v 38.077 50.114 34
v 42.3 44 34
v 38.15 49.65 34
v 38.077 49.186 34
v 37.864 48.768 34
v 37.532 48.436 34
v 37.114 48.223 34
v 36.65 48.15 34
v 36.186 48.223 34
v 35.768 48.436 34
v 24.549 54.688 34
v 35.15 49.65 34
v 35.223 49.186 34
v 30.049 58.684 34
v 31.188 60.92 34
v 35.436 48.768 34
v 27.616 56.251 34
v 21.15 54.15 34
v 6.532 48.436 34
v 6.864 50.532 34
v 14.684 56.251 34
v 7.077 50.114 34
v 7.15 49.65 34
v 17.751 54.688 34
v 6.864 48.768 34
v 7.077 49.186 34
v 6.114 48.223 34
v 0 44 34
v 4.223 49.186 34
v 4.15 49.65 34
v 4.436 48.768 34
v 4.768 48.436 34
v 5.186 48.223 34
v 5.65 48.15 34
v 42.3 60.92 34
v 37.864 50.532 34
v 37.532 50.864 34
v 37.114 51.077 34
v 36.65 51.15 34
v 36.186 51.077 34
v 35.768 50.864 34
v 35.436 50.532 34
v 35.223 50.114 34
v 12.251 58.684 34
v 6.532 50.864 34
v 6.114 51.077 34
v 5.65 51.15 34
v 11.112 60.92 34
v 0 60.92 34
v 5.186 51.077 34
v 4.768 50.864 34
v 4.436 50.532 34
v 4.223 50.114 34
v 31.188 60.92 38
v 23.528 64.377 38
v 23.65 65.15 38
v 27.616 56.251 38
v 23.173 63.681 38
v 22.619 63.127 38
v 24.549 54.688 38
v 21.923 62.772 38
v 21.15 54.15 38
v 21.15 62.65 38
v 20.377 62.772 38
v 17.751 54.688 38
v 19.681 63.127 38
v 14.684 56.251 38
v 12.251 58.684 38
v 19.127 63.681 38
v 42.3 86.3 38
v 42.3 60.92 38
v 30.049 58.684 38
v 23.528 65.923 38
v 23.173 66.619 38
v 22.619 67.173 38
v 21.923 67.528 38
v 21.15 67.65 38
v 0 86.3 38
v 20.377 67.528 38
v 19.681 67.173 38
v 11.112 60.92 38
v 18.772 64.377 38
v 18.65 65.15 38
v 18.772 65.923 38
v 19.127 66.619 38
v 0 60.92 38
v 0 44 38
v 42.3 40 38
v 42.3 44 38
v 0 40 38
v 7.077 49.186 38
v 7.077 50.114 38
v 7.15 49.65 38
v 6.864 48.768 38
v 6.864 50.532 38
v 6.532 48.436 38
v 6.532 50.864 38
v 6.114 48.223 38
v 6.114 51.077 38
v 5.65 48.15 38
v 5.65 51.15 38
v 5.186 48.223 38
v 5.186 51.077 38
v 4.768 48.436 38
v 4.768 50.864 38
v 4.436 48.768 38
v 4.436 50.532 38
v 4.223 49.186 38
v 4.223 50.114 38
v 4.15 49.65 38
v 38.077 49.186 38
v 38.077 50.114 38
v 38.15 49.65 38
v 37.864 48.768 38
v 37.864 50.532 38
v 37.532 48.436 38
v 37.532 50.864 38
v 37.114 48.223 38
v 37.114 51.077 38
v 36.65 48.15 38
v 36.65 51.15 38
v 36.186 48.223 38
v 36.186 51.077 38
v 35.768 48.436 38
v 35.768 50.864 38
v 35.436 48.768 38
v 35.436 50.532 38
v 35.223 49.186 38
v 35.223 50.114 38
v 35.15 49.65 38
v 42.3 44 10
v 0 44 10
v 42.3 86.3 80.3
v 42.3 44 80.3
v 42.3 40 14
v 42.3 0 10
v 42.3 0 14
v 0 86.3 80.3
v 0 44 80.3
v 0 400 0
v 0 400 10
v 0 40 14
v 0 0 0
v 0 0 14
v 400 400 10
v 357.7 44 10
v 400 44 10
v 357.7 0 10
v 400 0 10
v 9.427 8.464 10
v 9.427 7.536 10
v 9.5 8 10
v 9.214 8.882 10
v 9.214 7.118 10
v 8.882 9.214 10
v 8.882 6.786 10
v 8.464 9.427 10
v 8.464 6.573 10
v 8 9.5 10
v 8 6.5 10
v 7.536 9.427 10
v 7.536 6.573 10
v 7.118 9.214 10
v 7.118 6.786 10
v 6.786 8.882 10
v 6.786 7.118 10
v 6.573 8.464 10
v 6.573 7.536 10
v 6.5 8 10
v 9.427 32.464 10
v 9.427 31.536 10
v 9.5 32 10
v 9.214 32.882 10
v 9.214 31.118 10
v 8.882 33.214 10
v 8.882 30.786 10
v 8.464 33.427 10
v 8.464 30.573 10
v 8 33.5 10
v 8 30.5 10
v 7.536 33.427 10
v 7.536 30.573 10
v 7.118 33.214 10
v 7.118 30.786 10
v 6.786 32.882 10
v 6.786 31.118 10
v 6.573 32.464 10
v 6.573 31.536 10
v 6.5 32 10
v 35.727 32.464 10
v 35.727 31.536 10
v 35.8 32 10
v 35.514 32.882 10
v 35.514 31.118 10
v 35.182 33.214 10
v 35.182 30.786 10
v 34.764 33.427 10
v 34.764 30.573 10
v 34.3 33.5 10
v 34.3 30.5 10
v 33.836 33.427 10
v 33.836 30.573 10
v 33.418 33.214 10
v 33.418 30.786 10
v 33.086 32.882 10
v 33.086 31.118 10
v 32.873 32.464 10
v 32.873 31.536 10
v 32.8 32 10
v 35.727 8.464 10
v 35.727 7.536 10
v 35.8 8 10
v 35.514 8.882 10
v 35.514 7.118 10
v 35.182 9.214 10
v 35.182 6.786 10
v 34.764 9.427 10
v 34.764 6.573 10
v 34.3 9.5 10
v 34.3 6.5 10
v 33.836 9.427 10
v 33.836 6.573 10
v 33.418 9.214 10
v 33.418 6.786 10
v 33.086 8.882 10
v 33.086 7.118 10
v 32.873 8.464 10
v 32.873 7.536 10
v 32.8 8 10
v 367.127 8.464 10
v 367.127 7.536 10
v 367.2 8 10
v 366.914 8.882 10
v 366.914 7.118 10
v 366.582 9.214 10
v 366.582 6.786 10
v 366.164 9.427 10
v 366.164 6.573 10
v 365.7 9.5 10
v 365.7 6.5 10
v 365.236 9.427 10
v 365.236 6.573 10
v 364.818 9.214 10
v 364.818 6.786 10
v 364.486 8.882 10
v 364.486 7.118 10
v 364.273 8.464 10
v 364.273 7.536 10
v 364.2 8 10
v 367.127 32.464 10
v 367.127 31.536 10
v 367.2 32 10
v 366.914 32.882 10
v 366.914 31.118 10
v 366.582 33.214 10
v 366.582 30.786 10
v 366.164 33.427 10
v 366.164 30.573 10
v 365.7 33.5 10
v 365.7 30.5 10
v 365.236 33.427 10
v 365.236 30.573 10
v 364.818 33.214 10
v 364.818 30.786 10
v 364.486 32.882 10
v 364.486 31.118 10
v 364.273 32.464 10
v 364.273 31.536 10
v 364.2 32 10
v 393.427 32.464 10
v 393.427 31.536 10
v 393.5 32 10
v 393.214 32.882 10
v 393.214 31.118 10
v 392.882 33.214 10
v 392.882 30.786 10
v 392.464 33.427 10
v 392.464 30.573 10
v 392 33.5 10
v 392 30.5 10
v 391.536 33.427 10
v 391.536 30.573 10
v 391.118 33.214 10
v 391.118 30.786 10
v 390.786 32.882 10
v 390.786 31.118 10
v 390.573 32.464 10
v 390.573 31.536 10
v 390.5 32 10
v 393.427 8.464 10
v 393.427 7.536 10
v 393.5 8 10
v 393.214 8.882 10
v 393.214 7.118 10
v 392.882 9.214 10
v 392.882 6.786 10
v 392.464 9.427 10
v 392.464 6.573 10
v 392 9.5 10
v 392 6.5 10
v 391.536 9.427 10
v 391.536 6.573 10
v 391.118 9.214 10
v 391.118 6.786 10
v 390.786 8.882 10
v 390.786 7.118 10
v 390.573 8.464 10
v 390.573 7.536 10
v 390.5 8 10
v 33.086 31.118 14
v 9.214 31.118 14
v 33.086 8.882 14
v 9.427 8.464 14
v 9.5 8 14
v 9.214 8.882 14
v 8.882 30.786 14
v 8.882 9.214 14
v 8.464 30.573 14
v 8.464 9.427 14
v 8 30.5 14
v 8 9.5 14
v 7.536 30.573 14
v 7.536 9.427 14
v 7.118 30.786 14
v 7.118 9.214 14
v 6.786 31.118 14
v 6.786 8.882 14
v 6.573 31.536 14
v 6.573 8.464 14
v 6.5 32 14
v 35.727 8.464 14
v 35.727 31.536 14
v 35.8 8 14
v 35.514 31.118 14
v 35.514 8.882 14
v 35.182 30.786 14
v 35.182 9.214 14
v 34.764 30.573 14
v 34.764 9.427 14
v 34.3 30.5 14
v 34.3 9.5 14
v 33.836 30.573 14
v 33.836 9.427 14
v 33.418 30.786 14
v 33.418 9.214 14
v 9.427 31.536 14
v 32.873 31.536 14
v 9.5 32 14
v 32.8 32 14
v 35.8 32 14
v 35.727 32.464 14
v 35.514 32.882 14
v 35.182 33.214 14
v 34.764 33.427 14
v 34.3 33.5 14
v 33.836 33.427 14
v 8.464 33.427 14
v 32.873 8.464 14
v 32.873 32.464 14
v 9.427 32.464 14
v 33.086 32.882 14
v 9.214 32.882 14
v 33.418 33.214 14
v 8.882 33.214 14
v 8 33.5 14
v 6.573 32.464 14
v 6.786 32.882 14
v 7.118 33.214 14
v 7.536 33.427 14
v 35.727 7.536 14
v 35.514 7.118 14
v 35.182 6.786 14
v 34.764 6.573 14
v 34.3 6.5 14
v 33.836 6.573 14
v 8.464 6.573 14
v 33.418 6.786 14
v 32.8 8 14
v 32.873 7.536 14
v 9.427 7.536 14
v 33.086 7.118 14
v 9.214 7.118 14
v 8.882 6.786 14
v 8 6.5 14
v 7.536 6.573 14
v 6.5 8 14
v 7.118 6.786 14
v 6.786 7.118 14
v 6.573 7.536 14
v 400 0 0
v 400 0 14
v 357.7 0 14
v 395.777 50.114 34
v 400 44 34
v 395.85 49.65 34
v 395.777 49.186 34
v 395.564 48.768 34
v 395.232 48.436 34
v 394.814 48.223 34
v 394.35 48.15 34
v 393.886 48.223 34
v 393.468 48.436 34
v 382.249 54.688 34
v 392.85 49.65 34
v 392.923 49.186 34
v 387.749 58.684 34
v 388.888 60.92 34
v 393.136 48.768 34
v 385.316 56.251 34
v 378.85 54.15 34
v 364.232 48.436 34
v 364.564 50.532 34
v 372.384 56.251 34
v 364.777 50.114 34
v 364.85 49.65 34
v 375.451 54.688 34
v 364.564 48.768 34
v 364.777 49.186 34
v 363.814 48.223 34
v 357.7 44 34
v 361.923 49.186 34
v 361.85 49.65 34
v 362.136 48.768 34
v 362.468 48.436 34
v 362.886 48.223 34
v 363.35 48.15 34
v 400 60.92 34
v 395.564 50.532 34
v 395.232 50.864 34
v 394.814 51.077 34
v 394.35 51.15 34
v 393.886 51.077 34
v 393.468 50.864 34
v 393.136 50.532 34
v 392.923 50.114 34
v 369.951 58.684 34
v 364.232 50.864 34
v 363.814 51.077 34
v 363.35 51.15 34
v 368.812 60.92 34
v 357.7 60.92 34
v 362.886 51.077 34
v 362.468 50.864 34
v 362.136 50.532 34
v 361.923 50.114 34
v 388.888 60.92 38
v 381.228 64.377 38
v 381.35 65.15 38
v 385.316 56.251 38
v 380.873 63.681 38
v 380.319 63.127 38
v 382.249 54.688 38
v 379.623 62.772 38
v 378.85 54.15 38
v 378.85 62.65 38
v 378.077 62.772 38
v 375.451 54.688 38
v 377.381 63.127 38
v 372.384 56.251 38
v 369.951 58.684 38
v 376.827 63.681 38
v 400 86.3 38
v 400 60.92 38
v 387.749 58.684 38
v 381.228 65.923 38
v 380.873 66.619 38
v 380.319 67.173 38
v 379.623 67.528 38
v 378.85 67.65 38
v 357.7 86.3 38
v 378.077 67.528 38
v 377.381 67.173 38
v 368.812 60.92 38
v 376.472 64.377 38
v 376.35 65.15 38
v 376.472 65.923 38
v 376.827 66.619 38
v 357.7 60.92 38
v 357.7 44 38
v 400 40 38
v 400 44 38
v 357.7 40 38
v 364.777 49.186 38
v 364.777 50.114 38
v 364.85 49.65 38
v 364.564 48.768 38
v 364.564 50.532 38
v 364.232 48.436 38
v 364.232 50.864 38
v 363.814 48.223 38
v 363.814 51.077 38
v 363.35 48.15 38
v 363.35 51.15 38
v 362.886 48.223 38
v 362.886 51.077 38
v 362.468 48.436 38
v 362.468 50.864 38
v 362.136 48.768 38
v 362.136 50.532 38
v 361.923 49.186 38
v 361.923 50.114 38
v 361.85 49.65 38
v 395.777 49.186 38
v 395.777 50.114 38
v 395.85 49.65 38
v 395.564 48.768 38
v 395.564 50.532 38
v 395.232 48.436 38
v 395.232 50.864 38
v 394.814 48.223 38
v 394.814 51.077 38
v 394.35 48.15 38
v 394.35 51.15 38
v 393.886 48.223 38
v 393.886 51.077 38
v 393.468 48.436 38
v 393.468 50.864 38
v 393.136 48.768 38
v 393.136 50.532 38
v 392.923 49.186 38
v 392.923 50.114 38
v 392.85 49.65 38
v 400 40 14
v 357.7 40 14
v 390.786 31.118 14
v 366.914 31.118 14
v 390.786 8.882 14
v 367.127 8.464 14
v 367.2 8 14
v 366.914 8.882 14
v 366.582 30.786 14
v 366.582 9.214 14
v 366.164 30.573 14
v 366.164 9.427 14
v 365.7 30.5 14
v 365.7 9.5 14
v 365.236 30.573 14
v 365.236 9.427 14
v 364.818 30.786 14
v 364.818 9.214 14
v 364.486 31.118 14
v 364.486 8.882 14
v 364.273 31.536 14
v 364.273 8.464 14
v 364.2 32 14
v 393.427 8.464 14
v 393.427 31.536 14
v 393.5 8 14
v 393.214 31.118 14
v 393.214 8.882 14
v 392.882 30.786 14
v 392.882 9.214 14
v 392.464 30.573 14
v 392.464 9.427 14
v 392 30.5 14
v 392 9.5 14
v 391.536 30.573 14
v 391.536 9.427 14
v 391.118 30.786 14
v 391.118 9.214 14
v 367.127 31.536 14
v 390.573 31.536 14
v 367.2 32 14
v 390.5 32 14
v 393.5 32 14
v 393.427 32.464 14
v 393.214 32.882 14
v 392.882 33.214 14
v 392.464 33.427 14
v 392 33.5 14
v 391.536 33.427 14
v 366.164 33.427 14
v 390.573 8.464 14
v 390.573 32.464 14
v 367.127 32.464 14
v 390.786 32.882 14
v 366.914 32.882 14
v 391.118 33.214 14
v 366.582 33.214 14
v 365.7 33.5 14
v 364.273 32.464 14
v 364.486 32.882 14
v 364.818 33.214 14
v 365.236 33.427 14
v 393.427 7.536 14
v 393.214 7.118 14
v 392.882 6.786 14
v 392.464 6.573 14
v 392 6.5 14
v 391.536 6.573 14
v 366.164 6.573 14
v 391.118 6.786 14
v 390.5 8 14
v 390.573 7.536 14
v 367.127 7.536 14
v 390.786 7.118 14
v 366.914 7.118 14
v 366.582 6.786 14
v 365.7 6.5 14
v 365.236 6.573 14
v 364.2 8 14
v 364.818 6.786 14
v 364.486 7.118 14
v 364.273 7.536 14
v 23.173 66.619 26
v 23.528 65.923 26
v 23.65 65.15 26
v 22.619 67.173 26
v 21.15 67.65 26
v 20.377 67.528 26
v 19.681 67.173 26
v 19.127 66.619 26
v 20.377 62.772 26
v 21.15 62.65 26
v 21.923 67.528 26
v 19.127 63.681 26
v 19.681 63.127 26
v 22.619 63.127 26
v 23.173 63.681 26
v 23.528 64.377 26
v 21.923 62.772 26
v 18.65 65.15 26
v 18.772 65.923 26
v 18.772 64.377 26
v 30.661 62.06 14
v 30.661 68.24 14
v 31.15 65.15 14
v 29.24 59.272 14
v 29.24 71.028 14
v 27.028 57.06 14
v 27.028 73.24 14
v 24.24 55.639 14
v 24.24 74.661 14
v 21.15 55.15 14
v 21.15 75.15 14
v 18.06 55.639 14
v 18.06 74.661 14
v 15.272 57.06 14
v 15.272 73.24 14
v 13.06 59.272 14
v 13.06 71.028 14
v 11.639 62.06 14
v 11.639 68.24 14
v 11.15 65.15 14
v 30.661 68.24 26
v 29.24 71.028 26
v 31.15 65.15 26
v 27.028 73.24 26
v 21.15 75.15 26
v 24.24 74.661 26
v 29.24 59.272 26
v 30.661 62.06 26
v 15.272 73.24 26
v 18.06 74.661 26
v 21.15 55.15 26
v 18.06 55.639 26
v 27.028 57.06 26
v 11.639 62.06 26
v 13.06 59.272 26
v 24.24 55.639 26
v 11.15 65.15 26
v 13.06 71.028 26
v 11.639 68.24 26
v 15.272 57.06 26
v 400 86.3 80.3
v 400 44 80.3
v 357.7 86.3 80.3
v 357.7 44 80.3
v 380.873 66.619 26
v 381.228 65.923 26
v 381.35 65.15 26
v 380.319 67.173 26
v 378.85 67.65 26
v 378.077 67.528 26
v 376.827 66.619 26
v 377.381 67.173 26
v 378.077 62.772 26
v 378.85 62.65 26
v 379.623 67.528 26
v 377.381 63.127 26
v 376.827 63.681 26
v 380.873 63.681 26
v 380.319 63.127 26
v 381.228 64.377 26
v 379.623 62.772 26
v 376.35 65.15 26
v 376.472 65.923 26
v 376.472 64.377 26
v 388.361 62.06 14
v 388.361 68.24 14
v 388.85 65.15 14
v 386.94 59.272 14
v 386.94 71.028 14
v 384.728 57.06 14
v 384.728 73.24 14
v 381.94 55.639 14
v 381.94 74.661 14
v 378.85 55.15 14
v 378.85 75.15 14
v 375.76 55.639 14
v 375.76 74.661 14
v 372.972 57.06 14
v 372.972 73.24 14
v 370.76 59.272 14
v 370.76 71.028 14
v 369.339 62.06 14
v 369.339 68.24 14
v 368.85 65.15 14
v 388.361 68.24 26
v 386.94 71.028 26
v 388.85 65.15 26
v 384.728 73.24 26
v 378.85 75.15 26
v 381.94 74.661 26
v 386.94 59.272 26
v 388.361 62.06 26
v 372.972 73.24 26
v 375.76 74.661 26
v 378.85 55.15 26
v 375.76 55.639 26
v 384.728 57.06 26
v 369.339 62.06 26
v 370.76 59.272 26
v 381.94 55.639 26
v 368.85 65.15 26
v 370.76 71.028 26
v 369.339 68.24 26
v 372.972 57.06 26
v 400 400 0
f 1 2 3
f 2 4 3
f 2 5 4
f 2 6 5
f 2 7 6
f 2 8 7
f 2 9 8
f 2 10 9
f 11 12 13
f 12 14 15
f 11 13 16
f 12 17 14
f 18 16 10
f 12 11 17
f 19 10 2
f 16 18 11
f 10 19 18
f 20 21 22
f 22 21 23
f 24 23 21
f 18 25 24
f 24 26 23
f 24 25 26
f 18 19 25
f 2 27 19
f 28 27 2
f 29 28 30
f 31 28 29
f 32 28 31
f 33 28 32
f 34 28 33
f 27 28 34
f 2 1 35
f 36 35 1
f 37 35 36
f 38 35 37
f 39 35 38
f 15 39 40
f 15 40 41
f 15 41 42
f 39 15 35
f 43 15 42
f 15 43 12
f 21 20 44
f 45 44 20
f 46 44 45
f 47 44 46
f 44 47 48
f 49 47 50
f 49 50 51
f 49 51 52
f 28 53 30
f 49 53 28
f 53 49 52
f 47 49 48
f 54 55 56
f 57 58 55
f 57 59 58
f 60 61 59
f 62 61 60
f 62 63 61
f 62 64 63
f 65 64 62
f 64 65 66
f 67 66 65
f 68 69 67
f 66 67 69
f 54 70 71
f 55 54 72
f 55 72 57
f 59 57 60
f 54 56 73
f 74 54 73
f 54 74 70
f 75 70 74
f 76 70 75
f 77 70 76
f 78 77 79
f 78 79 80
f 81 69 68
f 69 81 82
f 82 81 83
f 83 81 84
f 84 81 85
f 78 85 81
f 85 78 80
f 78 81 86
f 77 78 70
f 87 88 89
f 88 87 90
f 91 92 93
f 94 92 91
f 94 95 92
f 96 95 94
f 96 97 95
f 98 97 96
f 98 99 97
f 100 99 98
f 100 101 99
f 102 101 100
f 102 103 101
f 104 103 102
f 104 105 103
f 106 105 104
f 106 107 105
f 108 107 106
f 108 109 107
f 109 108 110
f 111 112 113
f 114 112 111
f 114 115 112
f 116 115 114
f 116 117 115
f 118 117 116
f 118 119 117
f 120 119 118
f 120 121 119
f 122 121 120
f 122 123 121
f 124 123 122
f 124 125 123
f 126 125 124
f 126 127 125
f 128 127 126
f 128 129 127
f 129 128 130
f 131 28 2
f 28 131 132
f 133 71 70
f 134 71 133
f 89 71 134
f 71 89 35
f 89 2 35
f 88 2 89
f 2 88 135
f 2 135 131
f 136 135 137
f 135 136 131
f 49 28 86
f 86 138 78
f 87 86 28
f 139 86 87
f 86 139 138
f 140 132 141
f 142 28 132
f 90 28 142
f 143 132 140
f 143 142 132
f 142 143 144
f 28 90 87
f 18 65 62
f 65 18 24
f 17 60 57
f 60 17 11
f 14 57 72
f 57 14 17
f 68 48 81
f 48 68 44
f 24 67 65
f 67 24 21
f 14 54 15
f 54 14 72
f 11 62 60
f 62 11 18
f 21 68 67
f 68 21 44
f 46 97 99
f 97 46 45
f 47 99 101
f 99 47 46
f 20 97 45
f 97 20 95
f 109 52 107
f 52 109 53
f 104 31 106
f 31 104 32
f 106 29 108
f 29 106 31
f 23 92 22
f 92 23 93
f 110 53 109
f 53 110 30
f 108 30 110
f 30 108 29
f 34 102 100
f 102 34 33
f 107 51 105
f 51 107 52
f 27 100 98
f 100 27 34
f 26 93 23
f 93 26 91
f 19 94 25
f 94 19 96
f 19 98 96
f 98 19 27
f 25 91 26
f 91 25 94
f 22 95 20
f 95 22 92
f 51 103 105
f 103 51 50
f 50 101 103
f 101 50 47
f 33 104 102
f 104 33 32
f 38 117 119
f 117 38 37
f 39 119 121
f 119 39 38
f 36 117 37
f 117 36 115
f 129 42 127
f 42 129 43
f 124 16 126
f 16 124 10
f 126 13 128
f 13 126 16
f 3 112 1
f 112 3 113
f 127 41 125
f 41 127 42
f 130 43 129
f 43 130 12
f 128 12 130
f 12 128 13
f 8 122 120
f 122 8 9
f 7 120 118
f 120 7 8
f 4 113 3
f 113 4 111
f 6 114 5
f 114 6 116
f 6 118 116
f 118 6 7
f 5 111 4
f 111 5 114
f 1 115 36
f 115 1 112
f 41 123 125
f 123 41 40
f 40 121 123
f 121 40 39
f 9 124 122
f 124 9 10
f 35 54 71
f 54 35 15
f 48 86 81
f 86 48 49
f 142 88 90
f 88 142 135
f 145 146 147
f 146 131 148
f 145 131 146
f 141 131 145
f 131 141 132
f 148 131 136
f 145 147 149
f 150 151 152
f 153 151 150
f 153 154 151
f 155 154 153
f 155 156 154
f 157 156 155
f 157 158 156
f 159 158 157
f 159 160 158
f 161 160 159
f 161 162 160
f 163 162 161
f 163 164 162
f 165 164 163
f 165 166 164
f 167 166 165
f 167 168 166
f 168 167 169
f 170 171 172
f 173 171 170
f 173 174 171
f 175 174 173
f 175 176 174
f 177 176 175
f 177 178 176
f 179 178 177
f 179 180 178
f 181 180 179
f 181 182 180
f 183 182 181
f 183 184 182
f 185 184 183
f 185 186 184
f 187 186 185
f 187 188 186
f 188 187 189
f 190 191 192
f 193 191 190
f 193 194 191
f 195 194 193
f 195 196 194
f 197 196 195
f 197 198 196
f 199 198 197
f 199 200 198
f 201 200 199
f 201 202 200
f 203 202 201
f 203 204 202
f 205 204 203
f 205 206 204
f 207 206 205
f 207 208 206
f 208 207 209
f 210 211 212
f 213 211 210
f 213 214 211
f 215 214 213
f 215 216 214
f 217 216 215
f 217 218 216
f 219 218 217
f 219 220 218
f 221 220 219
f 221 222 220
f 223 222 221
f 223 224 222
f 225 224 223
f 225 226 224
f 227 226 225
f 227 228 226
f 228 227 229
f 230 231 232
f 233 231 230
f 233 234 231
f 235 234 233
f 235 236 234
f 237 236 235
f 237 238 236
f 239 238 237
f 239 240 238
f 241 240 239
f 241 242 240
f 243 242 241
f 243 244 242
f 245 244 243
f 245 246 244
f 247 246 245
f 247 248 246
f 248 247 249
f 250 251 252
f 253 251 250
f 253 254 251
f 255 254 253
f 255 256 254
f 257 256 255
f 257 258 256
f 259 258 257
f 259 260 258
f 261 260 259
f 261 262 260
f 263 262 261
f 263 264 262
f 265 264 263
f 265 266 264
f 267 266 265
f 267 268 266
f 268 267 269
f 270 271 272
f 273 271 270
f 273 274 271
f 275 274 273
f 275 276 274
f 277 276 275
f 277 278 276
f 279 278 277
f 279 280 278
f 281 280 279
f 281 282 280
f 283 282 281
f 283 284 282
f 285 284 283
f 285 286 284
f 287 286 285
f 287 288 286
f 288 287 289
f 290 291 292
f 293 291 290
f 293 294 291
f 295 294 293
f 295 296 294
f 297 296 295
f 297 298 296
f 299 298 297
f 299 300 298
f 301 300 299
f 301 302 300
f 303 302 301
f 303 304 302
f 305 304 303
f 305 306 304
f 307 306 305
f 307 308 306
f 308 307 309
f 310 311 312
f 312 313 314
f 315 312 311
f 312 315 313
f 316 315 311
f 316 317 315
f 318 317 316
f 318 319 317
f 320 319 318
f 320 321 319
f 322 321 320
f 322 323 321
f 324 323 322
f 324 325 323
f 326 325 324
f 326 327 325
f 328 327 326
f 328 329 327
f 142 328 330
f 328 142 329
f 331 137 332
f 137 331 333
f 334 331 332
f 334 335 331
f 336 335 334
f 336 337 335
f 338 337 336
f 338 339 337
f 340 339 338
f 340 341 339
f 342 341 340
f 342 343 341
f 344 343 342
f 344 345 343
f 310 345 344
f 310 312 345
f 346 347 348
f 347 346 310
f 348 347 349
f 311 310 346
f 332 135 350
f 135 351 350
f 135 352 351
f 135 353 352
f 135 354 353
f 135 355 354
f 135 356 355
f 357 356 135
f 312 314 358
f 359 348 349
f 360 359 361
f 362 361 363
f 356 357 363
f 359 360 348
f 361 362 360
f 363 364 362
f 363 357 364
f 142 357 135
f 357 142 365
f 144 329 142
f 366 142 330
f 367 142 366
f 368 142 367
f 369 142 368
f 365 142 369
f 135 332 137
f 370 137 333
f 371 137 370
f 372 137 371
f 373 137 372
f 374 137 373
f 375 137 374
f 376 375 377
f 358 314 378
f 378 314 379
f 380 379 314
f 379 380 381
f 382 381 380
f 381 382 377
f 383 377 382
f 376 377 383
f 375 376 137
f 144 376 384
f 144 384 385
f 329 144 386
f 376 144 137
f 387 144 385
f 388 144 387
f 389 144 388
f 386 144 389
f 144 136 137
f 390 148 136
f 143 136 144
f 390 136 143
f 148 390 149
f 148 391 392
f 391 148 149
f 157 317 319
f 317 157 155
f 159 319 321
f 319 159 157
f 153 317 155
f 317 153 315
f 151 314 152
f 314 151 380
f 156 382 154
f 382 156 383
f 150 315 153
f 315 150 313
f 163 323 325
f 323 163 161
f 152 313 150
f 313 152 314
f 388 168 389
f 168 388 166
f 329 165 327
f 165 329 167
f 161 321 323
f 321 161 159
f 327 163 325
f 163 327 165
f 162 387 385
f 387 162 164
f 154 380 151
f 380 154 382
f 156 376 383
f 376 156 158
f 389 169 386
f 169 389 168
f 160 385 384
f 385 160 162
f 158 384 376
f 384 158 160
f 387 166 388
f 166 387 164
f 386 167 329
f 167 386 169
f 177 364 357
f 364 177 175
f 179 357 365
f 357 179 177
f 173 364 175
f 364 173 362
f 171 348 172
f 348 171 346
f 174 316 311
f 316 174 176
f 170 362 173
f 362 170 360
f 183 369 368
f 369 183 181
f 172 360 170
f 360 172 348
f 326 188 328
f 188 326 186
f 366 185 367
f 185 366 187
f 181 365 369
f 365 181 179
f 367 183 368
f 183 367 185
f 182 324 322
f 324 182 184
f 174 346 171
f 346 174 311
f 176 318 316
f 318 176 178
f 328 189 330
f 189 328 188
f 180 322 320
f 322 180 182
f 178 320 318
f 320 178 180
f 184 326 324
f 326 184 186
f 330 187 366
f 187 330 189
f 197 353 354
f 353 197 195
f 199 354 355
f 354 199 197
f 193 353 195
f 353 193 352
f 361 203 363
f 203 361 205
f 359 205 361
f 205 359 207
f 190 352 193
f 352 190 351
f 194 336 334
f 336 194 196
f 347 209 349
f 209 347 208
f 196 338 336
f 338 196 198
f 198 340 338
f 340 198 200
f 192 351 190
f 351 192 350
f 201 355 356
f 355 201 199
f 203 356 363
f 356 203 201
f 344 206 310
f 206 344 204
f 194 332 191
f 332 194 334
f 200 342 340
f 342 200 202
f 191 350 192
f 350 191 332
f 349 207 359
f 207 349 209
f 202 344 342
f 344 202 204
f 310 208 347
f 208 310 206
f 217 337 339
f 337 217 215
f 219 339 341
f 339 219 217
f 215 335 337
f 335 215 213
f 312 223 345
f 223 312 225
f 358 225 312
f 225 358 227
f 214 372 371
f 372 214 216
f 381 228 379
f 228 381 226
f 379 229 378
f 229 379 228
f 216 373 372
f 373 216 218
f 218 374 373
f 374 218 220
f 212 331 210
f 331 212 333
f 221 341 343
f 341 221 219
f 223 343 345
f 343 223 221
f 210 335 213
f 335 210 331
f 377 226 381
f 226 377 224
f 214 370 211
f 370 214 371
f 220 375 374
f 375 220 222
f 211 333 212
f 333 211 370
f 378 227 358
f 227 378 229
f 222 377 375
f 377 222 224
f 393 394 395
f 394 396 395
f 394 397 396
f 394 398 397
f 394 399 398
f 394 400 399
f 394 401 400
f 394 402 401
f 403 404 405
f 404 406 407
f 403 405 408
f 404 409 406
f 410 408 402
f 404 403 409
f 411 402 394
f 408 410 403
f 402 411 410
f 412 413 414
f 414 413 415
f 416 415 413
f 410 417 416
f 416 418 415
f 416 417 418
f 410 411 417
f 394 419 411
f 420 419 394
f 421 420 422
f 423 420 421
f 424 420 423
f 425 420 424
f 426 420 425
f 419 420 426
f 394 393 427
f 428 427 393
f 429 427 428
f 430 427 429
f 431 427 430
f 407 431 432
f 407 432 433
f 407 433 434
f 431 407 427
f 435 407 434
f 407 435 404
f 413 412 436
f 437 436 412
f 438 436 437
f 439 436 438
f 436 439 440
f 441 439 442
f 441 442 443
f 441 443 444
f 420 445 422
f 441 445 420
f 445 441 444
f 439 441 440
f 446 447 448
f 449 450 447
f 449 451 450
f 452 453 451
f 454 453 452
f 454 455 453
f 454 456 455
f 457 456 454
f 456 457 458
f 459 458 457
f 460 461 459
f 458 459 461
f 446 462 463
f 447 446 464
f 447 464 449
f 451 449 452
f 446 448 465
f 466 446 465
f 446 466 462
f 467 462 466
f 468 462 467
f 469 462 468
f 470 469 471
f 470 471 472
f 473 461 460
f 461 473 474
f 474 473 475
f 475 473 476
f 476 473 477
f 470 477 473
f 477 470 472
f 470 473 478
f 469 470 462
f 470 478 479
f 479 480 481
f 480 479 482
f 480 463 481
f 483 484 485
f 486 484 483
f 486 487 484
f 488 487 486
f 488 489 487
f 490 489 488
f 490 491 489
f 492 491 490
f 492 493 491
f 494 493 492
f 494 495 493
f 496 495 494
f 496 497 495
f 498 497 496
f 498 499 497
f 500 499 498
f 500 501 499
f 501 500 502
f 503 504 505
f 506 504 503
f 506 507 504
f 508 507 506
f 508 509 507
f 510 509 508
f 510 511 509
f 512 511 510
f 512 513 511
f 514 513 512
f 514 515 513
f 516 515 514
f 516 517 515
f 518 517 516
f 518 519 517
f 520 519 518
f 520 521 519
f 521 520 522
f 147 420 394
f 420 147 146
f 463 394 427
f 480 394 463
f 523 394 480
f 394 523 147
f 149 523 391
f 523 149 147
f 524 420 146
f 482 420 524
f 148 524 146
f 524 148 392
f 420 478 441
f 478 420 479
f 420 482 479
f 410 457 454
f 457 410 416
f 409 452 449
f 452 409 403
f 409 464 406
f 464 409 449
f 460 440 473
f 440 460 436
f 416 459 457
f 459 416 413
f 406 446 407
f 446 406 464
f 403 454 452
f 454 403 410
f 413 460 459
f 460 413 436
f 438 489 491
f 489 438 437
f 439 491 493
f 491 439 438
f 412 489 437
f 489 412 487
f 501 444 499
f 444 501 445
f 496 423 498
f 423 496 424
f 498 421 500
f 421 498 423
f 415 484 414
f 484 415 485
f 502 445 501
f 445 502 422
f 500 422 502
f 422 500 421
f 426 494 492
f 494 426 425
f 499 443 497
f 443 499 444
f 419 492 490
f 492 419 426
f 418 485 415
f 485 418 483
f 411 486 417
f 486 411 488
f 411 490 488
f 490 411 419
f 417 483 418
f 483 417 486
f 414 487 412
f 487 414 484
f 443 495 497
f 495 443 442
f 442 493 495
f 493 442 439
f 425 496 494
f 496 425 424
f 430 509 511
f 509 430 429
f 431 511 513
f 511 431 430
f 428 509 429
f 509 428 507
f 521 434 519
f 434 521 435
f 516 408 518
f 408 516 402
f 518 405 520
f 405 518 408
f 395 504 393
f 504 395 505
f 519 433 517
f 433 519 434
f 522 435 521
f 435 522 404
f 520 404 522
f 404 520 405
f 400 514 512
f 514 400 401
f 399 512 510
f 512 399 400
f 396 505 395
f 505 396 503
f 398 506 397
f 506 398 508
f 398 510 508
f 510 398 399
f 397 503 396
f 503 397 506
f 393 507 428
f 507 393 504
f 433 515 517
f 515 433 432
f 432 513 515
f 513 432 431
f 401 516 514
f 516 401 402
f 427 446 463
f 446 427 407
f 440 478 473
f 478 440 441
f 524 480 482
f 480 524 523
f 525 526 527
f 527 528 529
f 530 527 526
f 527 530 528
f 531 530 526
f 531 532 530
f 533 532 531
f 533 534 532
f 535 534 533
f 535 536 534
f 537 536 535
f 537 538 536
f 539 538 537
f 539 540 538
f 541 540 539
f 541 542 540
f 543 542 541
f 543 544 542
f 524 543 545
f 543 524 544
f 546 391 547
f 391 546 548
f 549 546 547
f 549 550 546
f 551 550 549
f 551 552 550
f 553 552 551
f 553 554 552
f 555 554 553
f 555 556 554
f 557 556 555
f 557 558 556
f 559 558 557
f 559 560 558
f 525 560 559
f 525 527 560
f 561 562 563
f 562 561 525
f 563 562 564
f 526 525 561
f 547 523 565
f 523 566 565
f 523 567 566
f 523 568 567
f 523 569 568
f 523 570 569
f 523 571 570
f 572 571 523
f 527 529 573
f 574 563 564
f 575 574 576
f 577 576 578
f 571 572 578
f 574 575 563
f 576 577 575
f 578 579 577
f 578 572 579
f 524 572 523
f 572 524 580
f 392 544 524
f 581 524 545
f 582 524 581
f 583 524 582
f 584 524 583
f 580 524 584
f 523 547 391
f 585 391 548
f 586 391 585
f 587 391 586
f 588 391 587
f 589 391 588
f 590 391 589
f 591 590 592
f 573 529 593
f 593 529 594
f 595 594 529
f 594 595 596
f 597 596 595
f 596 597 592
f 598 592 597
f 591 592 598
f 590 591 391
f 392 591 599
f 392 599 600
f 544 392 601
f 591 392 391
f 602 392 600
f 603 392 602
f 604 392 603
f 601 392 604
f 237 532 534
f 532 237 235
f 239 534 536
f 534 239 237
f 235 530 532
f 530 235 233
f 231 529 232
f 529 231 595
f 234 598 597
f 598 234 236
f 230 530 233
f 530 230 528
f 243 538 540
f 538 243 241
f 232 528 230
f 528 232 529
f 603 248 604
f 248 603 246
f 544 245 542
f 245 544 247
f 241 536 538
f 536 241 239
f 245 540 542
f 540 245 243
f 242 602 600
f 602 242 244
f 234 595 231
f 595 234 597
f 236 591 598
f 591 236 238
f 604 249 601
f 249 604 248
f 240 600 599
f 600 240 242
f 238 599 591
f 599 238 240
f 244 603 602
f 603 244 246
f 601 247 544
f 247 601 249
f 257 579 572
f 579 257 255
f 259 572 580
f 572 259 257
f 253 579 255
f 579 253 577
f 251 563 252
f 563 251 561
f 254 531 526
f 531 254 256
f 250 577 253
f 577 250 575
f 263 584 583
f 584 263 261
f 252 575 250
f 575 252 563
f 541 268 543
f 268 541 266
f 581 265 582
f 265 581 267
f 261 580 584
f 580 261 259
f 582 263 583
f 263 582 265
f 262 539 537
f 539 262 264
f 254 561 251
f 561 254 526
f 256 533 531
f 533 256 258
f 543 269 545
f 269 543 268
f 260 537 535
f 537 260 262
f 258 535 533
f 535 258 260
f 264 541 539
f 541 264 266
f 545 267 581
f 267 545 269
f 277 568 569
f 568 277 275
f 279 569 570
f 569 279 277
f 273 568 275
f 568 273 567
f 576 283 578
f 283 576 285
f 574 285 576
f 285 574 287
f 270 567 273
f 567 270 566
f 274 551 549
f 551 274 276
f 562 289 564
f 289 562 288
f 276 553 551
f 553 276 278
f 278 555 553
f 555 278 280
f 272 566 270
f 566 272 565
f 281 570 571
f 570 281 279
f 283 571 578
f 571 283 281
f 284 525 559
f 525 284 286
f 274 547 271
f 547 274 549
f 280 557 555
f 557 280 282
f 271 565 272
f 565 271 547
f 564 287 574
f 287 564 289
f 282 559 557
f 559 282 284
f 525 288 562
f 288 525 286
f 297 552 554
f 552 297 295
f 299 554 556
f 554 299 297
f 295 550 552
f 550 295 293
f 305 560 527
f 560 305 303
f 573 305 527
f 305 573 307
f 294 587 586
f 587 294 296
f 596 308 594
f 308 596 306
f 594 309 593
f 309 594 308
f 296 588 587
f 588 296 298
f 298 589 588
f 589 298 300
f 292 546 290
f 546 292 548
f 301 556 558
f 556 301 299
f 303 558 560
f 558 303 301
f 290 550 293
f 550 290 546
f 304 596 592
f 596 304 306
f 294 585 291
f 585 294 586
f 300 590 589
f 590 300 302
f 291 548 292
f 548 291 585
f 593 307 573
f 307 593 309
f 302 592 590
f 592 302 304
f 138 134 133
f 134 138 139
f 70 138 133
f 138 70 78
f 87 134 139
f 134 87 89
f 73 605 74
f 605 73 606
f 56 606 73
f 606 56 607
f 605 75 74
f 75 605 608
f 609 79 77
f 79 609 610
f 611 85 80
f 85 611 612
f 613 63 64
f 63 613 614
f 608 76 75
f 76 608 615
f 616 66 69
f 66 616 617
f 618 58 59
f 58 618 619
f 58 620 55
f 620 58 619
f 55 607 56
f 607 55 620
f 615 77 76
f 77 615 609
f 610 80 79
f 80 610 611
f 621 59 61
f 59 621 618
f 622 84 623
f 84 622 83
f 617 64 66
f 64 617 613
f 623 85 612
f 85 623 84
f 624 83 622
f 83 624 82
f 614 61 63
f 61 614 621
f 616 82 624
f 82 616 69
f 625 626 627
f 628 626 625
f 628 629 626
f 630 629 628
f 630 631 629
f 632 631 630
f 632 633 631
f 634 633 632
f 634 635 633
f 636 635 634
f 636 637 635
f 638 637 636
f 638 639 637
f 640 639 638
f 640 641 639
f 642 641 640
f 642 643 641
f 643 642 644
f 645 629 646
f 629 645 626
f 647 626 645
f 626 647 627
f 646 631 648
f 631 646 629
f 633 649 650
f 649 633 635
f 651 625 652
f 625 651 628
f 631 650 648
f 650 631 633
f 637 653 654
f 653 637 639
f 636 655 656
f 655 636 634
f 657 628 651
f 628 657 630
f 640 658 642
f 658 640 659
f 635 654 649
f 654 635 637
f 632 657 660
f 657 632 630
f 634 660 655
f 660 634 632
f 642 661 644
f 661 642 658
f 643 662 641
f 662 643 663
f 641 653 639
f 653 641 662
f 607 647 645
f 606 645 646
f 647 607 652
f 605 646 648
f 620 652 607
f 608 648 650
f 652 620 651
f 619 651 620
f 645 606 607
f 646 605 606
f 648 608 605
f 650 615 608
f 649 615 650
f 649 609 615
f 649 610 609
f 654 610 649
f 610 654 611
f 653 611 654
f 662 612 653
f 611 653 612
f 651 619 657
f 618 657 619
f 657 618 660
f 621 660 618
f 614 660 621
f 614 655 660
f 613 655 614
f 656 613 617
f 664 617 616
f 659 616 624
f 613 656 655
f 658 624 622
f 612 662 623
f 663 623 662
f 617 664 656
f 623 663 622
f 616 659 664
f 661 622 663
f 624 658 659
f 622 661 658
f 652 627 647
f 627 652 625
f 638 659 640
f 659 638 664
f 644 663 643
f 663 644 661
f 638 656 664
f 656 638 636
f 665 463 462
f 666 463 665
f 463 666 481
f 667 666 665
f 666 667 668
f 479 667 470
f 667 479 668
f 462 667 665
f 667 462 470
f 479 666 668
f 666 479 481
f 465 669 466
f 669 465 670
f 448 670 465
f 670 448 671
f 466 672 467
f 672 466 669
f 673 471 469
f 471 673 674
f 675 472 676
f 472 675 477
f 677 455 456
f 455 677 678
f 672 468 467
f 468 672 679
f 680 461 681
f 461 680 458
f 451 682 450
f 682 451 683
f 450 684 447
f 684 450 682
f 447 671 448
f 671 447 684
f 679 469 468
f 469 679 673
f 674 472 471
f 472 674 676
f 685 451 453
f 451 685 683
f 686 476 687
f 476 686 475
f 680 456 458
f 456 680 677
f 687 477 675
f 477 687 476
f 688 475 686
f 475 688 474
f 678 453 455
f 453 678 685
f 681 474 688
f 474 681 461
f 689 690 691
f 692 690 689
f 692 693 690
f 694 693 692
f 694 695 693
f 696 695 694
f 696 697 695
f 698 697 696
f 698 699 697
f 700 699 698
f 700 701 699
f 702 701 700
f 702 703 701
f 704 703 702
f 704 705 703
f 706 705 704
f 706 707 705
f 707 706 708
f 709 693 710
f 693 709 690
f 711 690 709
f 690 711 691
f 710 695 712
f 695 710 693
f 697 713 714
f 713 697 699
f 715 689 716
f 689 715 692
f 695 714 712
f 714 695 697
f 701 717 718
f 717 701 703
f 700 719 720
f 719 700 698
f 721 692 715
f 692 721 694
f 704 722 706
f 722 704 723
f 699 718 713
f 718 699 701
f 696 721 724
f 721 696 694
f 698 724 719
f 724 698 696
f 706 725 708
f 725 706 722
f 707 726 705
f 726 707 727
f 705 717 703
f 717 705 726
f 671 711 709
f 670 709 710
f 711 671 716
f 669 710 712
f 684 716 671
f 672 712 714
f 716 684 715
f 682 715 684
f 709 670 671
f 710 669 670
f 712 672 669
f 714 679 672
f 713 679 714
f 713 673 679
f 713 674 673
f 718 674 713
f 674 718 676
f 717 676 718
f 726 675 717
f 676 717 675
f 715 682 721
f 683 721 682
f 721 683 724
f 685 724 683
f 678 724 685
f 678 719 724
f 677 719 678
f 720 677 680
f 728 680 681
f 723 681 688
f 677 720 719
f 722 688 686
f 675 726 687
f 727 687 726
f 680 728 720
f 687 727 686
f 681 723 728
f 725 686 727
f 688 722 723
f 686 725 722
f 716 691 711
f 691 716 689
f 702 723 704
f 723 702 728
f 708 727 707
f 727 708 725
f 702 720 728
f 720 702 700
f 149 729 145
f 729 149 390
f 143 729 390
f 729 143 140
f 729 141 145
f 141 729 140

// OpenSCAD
// file: stepper_bracket.scad
// ===========================================================================
// Bracket for stepper motor, including anchor.
//     Stepper motor is assumed to have NEMA 17 dimensions.
//     Metric screws are used. Their diameters may be changed below.
// ===========================================================================

// Specifications are for NEMA 17 dimensions.
// Reference: http://www.reprap.org/wiki/File:Step_motor_nema_17_stepper_motor.jpg

// Parameters for stepper bracket
BRACKET_EDGE_LENGTH = 42.3;
BRACKET_DIAMETER = 22;
BRACKET_THICKNESS = 4;
SCREW_DIAMETER = 3;
SCREW_DISTANCE = 31;
SHAFT_HEIGHT = 24;
// ------------------------------

// Parameters for anchor
ANCHOR_THICKNESS = 4;
ANCHOR_SHAFT_OVERHEAD = 4;
ANCHOR_WIDTH = 40;
ANCHOR_SCREW_MARGIN = 8;
ANCHOR_SCREW_DIAMETER = 3;
// ---------------------

$fn = 20;
module stepper_bracket() {
    // Add offset for easier use in other codes
    translate([ANCHOR_THICKNESS + ANCHOR_WIDTH, BRACKET_EDGE_LENGTH, SHAFT_HEIGHT + ANCHOR_SHAFT_OVERHEAD]) {
        // Rotate to place anchor down
        rotate([180, 0, 0]) {
            // Bracket part
            difference() {
                // Bracket base
                cube([BRACKET_EDGE_LENGTH, BRACKET_EDGE_LENGTH, BRACKET_THICKNESS]);

                // Bracket hole 
                translate([BRACKET_EDGE_LENGTH / 2, BRACKET_EDGE_LENGTH / 2, 0])
                    cylinder(r=BRACKET_DIAMETER / 2, h=BRACKET_THICKNESS);

                // Screw holes
                translate([BRACKET_EDGE_LENGTH / 2 - SCREW_DISTANCE / 2, BRACKET_EDGE_LENGTH / 2 - SCREW_DISTANCE / 2, 0])
                    cylinder(r=SCREW_DIAMETER / 2, h=BRACKET_THICKNESS);

                translate([BRACKET_EDGE_LENGTH / 2 + SCREW_DISTANCE / 2, BRACKET_EDGE_LENGTH / 2 - SCREW_DISTANCE / 2, 0])
                    cylinder(r=SCREW_DIAMETER / 2, h=BRACKET_THICKNESS);

                translate([BRACKET_EDGE_LENGTH / 2 - SCREW_DISTANCE / 2, BRACKET_EDGE_LENGTH / 2 + SCREW_DISTANCE / 2, 0])
                    cylinder(r=SCREW_DIAMETER / 2, h=BRACKET_THICKNESS);

                translate([BRACKET_EDGE_LENGTH / 2 + SCREW_DISTANCE / 2, BRACKET_EDGE_LENGTH / 2 + SCREW_DISTANCE / 2, 0])
                    cylinder(r=SCREW_DIAMETER / 2, h=BRACKET_THICKNESS);

                // Only a fraction of the bracket is really necessary
                translate([2 * BRACKET_EDGE_LENGTH / 5, 0, 0])
                    cube([3 * BRACKET_EDGE_LENGTH / 5, BRACKET_EDGE_LENGTH, BRACKET_THICKNESS]);
            }


            // Anchor part
            translate([-ANCHOR_THICKNESS, 0, 0]) {
                union() {
                    // Anchor wall
                    cube([ANCHOR_THICKNESS, BRACKET_EDGE_LENGTH, SHAFT_HEIGHT + ANCHOR_SHAFT_OVERHEAD]);

                    // Anchor
                    translate([-ANCHOR_WIDTH, 0, SHAFT_HEIGHT + ANCHOR_SHAFT_OVERHEAD - BRACKET_THICKNESS])
                    difference() {
                        // Anchor base
                        cube([ANCHOR_WIDTH, BRACKET_EDGE_LENGTH, ANCHOR_THICKNESS]);

                        // Screw holes
                        translate([ANCHOR_SCREW_MARGIN, ANCHOR_SCREW_MARGIN, 0])
                            cylinder(r=ANCHOR_SCREW_DIAMETER / 2, h = ANCHOR_THICKNESS);
                            
                        translate([ANCHOR_WIDTH - ANCHOR_SCREW_MARGIN, ANCHOR_SCREW_MARGIN, 0])
                            cylinder(r=ANCHOR_SCREW_DIAMETER / 2, h = ANCHOR_THICKNESS);
                            
                        translate([ANCHOR_WIDTH - ANCHOR_SCREW_MARGIN, BRACKET_EDGE_LENGTH - ANCHOR_SCREW_MARGIN, 0])
                            cylinder(r=ANCHOR_SCREW_DIAMETER / 2, h = ANCHOR_THICKNESS);

                        translate([ANCHOR_SCREW_MARGIN, BRACKET_EDGE_LENGTH - ANCHOR_SCREW_MARGIN, 0])
                            cylinder(r=ANCHOR_SCREW_DIAMETER / 2, h = ANCHOR_THICKNESS);
                    }
                }
            }
        }
    }
}
// main file
// ===========================================================================
// Visualize the whole XY-stage
// ===========================================================================

include <stepper_bracket.scad>;

STAGE_LENGTH = 400;
STAGE_THICKNESS = 10;

// XY base
color("aqua")
cube([STAGE_LENGTH, STAGE_LENGTH, STAGE_THICKNESS]);

// Stepper brackets
color("greenyellow")
union() {
    translate([BRACKET_EDGE_LENGTH, 0, STAGE_THICKNESS])
        rotate([0, 0, 90])
            stepper_bracket();

    translate([STAGE_LENGTH, 0, STAGE_THICKNESS])
        rotate([0, 0, 90])
            stepper_bracket();
}

// Stepper motor mockups
module stepper_motor() {
    // Motor body
    cube([BRACKET_EDGE_LENGTH, BRACKET_EDGE_LENGTH, BRACKET_EDGE_LENGTH]);

    // Shaft with pulleys
    translate([BRACKET_EDGE_LENGTH / 2, BRACKET_EDGE_LENGTH / 2, -SHAFT_HEIGHT]) {
        cylinder(r=2.5, h=SHAFT_HEIGHT);
    }
    
    translate([BRACKET_EDGE_LENGTH / 2, BRACKET_EDGE_LENGTH / 2, -SHAFT_HEIGHT]) {
        cylinder(r=10, h=12);
    }
}
color("gold")
union() {
    translate([0, ANCHOR_WIDTH + ANCHOR_THICKNESS, STAGE_THICKNESS + ANCHOR_SHAFT_OVERHEAD + SHAFT_HEIGHT]) {
        stepper_motor();
    }

    translate([STAGE_LENGTH - BRACKET_EDGE_LENGTH, ANCHOR_WIDTH + ANCHOR_THICKNESS, STAGE_THICKNESS + ANCHOR_SHAFT_OVERHEAD + SHAFT_HEIGHT]) {
        stepper_motor();
    }
}
